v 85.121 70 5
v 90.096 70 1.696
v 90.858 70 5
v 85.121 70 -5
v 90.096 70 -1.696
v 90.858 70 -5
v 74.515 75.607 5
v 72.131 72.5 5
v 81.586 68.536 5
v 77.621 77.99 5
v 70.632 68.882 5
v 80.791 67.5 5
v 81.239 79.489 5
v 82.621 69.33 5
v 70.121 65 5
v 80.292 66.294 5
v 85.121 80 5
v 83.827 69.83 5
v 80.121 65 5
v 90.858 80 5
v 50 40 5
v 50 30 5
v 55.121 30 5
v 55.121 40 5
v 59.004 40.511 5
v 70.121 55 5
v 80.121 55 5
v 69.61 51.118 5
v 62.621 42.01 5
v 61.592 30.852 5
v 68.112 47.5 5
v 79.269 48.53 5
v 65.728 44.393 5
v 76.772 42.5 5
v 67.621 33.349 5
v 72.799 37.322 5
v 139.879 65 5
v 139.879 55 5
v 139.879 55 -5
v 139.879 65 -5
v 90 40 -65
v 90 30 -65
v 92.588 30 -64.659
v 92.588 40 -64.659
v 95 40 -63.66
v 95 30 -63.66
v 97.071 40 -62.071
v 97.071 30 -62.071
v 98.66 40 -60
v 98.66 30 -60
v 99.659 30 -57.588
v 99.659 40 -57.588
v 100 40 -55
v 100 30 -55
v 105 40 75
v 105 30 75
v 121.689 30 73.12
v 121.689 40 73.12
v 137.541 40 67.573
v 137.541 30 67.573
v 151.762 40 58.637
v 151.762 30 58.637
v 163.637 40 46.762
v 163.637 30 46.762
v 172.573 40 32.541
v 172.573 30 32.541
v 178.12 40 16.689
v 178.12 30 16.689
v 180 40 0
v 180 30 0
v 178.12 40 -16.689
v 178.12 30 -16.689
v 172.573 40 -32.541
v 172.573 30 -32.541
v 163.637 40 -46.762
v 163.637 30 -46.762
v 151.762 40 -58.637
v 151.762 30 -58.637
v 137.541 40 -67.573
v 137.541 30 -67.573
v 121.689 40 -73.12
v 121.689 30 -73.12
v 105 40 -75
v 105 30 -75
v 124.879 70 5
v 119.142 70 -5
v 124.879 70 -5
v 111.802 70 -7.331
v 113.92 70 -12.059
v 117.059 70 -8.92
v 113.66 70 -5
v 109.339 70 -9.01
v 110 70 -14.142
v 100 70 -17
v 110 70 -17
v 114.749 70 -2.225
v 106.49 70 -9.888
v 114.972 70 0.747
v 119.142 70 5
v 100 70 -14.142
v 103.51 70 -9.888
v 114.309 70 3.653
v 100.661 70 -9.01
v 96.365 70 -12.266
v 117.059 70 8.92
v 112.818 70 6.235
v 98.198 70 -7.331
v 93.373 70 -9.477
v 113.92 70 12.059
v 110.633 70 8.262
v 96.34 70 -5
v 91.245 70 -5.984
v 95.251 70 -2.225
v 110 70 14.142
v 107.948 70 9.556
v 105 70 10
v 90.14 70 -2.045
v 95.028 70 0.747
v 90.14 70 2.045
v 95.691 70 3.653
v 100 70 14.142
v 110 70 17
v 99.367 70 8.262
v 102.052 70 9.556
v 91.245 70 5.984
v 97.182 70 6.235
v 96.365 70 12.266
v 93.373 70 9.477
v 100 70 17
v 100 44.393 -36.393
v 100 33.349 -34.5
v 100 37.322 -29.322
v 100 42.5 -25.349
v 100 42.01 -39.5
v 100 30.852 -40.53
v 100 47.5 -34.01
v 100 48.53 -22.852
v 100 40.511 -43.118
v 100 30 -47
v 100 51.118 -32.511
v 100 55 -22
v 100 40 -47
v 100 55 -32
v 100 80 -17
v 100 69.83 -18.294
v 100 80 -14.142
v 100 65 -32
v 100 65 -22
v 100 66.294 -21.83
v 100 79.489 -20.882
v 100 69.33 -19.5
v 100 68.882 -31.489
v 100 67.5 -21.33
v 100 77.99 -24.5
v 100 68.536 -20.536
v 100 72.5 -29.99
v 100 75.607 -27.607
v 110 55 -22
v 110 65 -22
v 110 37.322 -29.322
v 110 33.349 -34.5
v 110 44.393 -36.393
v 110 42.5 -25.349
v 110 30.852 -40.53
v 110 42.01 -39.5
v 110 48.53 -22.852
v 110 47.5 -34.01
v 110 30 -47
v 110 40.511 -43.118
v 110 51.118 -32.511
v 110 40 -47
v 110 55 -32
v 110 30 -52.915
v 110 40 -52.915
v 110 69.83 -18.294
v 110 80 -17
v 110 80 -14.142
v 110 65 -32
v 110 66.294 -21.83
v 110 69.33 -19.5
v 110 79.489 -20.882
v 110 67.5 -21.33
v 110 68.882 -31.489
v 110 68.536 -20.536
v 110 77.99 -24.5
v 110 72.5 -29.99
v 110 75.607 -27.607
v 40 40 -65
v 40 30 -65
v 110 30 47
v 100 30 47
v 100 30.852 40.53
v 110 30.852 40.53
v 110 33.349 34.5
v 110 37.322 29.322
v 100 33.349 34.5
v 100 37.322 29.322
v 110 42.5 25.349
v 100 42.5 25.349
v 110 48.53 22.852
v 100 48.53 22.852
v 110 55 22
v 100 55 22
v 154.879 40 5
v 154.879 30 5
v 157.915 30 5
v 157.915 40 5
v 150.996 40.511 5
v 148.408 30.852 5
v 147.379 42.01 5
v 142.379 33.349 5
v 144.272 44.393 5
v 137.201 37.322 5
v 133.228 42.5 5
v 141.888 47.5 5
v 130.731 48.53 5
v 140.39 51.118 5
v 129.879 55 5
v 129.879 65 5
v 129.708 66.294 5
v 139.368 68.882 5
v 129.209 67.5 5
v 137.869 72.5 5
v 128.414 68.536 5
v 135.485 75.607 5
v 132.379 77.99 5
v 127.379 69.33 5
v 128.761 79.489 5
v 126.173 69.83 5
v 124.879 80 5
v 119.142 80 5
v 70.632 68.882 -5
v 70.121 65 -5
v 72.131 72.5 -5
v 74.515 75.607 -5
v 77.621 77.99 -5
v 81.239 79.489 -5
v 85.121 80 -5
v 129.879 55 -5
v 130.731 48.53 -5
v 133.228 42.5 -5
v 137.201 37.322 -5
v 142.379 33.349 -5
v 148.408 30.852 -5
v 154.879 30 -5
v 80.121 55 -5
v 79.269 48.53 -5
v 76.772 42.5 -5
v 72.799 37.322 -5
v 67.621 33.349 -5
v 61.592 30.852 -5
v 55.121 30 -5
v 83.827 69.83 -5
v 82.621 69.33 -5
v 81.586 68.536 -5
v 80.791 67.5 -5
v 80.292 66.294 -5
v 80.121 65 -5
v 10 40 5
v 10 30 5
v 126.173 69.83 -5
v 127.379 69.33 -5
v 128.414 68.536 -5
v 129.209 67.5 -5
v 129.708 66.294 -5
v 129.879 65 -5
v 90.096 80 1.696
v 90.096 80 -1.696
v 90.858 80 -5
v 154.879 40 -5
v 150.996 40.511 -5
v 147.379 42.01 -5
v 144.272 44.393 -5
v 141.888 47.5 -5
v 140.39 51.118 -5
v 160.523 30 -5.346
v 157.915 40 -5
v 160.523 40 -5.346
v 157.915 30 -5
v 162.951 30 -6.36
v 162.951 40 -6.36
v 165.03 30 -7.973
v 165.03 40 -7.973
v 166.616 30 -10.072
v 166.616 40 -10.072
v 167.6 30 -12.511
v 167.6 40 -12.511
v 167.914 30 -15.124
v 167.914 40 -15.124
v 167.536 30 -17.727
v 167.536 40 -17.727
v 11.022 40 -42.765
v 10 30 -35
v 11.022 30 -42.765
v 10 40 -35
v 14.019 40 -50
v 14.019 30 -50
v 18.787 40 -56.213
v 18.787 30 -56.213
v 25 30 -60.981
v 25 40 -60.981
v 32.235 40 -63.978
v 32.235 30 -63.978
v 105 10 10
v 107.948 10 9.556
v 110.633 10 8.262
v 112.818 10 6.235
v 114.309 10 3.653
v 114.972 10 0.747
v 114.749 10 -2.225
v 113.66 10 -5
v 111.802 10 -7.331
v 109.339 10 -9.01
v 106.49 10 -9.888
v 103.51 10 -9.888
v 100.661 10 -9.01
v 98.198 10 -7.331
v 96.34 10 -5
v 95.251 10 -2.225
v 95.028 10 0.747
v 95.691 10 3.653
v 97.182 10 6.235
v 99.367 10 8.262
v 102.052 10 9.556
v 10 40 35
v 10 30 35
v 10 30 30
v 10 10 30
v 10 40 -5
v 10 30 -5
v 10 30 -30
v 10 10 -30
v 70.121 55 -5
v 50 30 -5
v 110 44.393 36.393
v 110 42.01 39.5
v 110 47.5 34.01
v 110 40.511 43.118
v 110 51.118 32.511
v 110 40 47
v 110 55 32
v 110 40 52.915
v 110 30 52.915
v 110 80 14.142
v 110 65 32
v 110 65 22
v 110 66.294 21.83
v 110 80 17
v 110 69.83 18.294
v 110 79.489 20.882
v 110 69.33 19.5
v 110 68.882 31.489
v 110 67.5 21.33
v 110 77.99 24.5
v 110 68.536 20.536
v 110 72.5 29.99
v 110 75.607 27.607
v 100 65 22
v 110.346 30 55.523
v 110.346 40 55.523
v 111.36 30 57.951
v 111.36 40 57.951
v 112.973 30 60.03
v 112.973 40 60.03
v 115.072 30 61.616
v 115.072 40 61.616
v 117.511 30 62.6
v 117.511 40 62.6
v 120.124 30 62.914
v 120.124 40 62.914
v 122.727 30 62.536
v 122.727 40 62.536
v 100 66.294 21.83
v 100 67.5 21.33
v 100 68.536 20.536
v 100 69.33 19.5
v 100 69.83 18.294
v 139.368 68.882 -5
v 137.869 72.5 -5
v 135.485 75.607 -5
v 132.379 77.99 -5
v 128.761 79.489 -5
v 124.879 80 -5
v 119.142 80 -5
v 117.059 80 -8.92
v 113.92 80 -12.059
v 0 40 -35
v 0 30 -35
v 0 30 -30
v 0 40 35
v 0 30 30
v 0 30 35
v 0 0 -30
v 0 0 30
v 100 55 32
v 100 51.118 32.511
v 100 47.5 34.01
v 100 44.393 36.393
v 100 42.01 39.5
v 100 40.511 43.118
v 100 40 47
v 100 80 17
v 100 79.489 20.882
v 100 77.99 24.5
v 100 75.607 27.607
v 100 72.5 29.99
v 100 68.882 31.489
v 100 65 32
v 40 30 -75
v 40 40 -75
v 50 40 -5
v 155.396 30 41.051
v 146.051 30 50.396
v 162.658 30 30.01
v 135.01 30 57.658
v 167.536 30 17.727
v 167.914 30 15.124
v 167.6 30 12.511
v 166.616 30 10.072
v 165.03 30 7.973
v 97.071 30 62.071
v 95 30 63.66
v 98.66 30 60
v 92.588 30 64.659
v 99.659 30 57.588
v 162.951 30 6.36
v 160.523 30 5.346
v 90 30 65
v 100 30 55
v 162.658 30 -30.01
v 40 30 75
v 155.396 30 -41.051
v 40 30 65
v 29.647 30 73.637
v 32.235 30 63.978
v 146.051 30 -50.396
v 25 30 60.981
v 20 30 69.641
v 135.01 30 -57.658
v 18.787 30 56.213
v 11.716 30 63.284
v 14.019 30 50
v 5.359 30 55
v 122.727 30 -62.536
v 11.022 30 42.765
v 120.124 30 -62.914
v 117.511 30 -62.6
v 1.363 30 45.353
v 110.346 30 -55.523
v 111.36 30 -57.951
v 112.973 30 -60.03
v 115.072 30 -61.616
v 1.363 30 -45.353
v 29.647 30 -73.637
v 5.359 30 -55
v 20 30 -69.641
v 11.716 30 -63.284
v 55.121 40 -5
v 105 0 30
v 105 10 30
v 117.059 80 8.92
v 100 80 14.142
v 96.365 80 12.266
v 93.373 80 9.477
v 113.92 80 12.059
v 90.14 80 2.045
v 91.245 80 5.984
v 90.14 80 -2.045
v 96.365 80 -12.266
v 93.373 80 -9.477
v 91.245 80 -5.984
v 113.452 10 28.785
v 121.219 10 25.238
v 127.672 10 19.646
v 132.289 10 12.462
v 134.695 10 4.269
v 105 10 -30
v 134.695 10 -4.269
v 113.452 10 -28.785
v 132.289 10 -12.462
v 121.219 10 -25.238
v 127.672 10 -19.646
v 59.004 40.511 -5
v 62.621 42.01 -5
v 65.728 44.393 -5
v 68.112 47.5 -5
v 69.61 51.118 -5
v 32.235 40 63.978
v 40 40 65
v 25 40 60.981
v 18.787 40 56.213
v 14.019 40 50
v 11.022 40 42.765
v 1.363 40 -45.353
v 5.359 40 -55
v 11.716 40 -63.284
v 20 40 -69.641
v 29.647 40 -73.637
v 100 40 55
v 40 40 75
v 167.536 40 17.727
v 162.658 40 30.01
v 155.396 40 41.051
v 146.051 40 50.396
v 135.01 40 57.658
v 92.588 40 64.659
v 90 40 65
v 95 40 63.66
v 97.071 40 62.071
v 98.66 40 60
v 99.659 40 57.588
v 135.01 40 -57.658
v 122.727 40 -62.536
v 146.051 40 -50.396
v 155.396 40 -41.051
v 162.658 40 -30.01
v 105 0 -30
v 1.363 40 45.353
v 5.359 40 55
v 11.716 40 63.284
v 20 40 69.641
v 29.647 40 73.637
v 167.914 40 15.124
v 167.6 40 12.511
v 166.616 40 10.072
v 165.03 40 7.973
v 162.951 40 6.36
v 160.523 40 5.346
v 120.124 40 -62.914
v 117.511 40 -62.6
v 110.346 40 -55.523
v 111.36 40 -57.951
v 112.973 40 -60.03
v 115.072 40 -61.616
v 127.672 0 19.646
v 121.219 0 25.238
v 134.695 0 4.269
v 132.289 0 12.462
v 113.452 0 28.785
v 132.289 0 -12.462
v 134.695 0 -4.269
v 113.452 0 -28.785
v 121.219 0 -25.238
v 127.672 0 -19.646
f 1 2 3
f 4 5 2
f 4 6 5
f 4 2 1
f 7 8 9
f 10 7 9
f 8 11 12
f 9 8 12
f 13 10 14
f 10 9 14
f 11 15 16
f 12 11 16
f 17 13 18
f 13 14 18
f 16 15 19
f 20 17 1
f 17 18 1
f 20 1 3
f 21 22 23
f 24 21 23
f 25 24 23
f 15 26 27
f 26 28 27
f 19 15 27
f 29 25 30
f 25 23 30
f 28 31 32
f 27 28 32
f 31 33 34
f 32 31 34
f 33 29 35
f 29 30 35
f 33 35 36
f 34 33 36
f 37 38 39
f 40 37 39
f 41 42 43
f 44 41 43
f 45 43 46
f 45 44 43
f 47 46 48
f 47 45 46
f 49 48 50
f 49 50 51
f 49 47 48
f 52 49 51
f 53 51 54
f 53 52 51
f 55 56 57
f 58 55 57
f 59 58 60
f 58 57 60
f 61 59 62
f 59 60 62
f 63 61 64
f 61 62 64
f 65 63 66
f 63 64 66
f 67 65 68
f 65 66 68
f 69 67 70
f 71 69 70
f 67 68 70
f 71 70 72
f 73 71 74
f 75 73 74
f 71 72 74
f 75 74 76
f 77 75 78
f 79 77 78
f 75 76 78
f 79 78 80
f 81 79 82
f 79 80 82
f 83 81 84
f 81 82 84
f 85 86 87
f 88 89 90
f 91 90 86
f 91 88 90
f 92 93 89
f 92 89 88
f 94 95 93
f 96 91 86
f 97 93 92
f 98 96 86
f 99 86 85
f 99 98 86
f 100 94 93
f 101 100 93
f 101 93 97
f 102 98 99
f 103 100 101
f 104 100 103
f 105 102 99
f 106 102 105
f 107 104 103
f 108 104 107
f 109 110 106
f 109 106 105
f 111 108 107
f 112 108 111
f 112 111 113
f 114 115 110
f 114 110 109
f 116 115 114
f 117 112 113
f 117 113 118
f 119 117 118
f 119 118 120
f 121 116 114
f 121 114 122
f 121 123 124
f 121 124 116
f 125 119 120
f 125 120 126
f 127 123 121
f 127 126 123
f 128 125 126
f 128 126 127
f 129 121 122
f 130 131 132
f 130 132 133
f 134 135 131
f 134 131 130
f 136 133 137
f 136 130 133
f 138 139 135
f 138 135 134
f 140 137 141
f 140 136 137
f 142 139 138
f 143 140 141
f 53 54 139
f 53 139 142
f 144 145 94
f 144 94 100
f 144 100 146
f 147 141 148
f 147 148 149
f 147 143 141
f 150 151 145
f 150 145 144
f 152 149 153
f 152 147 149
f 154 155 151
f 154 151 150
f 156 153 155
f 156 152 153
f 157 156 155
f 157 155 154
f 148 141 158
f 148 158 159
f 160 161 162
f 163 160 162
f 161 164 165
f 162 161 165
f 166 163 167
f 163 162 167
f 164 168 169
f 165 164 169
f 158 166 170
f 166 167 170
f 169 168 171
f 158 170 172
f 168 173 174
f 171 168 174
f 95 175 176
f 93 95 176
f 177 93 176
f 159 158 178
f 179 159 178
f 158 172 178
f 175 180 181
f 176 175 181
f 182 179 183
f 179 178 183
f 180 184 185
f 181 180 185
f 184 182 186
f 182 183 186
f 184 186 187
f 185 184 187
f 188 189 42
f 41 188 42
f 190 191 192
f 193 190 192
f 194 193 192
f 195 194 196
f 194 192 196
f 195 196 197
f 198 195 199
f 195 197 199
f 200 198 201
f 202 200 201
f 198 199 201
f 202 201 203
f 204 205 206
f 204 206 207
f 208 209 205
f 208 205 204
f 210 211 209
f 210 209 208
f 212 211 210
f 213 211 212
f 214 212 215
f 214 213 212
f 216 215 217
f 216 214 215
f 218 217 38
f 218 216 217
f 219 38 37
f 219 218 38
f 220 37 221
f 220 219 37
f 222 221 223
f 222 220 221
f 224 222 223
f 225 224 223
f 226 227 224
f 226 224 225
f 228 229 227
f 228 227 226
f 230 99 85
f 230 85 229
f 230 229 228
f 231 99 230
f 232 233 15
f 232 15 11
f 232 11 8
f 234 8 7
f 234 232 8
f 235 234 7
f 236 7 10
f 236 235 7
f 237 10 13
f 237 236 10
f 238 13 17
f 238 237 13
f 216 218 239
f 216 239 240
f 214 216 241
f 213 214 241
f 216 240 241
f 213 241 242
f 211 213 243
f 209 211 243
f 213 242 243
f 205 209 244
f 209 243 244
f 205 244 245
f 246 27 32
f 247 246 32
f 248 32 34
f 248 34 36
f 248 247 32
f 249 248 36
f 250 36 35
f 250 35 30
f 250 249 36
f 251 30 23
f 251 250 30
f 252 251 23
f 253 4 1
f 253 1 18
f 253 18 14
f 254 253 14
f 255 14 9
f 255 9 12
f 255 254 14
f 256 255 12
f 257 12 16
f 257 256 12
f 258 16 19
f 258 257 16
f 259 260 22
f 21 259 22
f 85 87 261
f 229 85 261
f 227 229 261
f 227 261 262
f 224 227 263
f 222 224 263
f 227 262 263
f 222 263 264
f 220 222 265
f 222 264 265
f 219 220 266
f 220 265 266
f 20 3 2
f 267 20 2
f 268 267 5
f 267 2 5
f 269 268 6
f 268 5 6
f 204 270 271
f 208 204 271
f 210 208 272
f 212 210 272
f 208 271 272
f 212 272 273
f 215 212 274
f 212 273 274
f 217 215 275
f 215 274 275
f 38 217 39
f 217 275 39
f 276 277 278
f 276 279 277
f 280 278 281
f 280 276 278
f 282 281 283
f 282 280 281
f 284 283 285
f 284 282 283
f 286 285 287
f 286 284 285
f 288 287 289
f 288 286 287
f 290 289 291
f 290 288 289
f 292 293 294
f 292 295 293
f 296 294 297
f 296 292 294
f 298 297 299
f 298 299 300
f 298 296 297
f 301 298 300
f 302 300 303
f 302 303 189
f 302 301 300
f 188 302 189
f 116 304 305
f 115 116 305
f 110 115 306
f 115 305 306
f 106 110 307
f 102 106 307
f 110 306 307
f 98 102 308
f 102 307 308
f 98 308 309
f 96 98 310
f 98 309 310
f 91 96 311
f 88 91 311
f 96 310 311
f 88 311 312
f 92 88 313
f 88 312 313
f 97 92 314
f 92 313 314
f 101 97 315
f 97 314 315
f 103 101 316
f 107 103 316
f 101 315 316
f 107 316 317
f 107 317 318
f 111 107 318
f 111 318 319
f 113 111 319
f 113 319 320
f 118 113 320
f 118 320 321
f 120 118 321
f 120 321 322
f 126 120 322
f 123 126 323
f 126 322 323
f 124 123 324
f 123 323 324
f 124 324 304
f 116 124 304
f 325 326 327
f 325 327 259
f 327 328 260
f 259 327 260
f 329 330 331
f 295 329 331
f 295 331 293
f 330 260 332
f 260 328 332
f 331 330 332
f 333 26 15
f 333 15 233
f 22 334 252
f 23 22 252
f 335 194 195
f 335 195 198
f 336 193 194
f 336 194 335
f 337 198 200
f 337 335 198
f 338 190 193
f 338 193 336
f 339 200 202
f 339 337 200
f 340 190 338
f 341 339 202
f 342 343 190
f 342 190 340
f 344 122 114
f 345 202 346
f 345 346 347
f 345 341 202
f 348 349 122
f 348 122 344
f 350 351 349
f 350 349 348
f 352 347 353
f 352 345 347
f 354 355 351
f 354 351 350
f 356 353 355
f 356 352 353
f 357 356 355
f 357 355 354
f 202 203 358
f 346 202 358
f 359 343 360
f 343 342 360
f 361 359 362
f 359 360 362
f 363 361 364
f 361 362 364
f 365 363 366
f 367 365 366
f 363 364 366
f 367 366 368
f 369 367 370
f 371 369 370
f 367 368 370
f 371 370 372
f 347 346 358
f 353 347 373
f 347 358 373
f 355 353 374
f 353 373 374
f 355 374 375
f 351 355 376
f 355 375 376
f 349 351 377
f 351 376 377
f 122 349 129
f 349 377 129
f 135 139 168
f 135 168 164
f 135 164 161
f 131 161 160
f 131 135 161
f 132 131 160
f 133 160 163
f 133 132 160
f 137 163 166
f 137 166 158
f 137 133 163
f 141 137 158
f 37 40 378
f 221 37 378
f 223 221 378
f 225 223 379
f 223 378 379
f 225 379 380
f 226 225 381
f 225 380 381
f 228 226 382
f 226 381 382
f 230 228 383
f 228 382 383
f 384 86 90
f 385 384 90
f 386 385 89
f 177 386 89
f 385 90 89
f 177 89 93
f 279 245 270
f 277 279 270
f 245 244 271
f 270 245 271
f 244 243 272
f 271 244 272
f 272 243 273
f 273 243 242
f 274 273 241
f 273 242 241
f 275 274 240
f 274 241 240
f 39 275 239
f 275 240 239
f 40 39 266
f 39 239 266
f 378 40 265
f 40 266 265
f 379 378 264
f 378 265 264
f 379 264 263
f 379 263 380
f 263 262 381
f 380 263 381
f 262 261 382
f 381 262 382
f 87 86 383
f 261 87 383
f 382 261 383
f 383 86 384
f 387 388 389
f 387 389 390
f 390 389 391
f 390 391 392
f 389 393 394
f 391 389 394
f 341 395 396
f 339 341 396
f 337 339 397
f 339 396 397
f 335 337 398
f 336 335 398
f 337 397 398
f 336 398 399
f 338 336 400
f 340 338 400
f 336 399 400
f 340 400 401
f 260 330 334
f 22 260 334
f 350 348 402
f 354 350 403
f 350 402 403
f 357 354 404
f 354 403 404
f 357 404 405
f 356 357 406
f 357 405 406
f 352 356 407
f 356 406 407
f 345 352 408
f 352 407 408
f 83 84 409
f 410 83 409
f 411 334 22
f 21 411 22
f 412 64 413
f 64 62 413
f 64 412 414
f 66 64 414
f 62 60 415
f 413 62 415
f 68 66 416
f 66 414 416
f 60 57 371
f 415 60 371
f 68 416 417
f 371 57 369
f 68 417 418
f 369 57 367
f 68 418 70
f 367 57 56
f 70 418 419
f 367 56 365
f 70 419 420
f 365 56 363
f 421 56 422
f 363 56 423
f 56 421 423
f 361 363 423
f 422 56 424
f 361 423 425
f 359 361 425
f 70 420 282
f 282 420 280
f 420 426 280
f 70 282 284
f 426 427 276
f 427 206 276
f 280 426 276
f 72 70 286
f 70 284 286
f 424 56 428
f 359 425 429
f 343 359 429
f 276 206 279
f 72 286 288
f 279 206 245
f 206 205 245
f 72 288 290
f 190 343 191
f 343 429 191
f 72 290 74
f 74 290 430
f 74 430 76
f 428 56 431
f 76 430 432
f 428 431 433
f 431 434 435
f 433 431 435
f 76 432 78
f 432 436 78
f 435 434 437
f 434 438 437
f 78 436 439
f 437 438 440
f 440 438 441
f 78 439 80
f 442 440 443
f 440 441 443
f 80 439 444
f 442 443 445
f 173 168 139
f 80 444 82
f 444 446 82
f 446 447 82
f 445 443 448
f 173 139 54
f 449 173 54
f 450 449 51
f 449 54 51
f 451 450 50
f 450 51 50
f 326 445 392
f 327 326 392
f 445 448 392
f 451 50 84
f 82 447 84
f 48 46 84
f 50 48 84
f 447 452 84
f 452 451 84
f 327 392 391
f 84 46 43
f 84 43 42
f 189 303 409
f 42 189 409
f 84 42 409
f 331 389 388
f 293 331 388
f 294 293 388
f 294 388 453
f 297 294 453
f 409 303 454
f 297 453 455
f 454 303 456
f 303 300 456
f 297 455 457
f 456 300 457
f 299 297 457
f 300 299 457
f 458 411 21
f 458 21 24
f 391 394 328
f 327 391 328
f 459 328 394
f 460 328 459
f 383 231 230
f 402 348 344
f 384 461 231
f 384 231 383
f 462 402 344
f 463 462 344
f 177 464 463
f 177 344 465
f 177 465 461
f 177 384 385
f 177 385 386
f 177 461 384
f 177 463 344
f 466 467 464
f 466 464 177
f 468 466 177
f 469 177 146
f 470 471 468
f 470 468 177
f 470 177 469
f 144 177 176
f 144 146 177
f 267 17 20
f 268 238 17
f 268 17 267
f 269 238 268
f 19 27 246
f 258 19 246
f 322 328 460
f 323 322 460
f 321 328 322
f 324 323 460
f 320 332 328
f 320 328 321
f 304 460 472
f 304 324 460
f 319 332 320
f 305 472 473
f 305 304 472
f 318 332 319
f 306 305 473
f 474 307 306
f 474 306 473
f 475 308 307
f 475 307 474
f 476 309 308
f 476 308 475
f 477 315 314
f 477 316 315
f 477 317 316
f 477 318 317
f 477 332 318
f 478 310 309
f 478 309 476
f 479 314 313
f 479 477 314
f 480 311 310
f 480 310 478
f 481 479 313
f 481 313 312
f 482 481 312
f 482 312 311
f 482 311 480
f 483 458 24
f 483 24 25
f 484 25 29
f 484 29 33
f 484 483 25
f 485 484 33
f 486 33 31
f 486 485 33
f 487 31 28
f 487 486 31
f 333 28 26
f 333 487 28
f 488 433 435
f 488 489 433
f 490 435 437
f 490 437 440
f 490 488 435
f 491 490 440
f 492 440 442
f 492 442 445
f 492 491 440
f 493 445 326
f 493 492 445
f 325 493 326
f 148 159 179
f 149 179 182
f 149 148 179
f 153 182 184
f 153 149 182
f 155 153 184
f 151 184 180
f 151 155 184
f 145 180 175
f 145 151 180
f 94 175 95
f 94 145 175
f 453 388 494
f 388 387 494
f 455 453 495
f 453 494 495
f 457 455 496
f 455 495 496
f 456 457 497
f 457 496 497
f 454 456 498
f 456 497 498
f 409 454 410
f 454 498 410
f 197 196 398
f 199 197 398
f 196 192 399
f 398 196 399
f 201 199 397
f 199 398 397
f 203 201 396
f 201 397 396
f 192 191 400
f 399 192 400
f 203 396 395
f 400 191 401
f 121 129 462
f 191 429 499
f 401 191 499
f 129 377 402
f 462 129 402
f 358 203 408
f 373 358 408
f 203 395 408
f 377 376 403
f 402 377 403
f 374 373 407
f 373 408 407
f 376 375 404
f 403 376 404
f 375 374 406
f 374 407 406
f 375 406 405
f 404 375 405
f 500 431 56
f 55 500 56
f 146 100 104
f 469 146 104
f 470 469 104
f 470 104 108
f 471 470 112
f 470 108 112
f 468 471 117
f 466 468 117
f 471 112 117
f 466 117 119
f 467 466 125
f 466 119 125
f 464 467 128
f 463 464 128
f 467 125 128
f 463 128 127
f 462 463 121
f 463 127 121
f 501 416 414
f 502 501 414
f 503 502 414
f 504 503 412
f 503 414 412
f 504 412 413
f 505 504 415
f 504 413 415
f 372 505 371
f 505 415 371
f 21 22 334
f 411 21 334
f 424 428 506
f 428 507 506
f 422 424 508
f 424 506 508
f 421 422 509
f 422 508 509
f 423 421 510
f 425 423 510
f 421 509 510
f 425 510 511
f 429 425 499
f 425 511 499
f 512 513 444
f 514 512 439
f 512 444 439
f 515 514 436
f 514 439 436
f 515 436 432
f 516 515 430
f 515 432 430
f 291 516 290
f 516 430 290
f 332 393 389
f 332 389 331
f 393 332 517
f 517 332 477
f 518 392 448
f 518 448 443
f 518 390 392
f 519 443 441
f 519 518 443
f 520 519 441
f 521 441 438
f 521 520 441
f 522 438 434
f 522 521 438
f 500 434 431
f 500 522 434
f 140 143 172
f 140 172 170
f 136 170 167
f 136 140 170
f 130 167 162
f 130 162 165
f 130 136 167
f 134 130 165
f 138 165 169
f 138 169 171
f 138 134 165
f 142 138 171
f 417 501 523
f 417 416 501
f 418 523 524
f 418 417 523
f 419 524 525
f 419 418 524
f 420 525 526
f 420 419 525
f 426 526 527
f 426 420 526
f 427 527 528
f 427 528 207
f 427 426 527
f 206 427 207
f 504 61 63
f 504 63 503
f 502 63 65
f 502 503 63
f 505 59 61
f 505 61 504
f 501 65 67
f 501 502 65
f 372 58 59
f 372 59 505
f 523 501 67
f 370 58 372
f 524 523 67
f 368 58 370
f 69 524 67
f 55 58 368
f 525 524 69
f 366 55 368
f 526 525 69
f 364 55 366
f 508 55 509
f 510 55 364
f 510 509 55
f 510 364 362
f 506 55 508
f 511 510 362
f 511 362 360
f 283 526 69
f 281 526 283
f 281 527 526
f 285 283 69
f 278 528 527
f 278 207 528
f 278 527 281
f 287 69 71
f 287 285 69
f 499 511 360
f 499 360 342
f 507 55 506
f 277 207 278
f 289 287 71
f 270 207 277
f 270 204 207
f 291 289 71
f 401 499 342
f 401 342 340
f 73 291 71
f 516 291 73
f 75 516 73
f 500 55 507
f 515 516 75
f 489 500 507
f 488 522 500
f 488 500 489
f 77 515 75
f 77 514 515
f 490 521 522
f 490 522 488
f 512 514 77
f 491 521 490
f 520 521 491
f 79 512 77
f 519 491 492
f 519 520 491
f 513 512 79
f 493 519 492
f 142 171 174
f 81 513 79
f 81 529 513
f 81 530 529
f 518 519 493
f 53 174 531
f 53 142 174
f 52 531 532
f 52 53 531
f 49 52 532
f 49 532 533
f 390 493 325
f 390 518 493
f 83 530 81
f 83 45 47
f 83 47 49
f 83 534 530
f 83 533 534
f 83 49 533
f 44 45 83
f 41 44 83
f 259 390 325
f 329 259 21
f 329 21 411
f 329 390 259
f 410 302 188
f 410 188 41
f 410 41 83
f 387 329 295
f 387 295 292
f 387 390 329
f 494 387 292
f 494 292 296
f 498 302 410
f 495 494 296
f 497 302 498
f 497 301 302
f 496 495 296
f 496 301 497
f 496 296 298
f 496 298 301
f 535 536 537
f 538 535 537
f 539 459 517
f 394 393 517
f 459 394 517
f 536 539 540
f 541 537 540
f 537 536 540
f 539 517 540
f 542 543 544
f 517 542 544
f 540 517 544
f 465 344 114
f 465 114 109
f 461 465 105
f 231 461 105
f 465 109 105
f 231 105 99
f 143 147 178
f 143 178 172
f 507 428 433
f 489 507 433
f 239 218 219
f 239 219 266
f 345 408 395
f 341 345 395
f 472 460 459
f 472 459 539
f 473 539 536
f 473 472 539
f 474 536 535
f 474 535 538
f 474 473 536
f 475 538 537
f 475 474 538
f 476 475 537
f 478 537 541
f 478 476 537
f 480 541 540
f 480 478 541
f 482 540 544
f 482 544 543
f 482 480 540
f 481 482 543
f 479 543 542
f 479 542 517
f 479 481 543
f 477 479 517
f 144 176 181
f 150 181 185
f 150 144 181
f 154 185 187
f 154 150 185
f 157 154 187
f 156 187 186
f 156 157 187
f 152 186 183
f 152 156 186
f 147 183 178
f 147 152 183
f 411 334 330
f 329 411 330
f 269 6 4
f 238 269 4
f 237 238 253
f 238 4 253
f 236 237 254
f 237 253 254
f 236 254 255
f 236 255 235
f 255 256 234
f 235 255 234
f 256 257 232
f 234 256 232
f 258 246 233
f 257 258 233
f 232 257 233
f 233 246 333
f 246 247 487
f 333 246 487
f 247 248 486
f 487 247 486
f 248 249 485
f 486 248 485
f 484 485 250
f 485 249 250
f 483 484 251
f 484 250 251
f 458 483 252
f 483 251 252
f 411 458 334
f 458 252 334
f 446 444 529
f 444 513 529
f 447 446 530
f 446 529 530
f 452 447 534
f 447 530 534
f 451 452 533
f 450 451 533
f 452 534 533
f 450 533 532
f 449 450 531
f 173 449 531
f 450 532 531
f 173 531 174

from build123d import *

# Parameters (mm, degrees)
BOSS_EXTRUDE1_DEPTH = 30
BOSS_EXTRUDE2_DEPTH = 10
SKETCH4_R           = 10
BOSS_EXTRUDE3_DEPTH = 60
SKETCH5_R           = 15
BOSS_EXTRUDE4_DEPTH = 10
BOSS_EXTRUDE5_DEPTH = 10
SWEEP4_START        = 55
SWEEP4_OUTLINE_W    = 10
SWEEP4_OUTLINE_H    = 10
SWEEP4_DEPTH        = 10
SWEEP4_START_2      = 30
SWEEP4_2_DEPTH      = 25
SWEEP4_START_3      = 65
SWEEP4_3_DEPTH      = 15
SWEEP4_START_4      = -5
SWEEP4_4_DEPTH      = 10
SWEEP6_START        = 100
SWEEP6_DEPTH        = 10
BOSS_EXTRUDE6_REACH = 195.972
SKETCH12_W          = 10
SKETCH12_H          = 10
FILLET1_R           = 30
FILLET2_R           = 40
FILLET3_R           = 10


with BuildPart() as part:
    # Sketch2 → Boss-Extrude1 (new, symmetric)
    with BuildSketch(Plane.XY):
        Polygon((0, 10), (0, 0), (10, 0), (105, 0), (105, 10), (10, 10), (10, 30), (0, 30), align=None)
    extrude(amount=BOSS_EXTRUDE1_DEPTH, both=True)

    # Sketch3 → Boss-Extrude2 (add)
    with BuildSketch(Plane(origin=(0, 10, 0), x_dir=(1, 0, 0), z_dir=(0, 1, 0))):
        with BuildLine():
            Line((105, 30), (105, -30))
            ThreePointArc((105, -30), (135, 0), (105, 30))
        make_face()
    extrude(amount=-BOSS_EXTRUDE2_DEPTH)

    # Sketch4 → Boss-Extrude3 (add)
    with BuildSketch(Plane(origin=(0, 10, 0), x_dir=(1, 0, 0), z_dir=(0, 1, 0))):
        with Locations(Location((105, 0, 0), (0, 0, 270))):
            Circle(SKETCH4_R)
    extrude(amount=BOSS_EXTRUDE3_DEPTH)

    # Sketch5 → Boss-Extrude4 (add)
    with BuildSketch(Plane(origin=(0, 70, 0), x_dir=(1, 0, 0), z_dir=(0, 1, 0))):
        with Locations(Location((105, 0, 0), (0, 0, 270))):
            Circle(SKETCH5_R)
    extrude(amount=BOSS_EXTRUDE4_DEPTH)

    # Sketch6 → Boss-Extrude5 (add)
    with BuildSketch(Plane(origin=(0, 30, 0), x_dir=(1, 0, 0), z_dir=(0, 1, 0))):
        with BuildLine():
            Line((0, 75), (0, 0))
            Line((0, 0), (0, -75))
            Line((0, -75), (105, -75))
            ThreePointArc((105, -75), (158.033008589, -53.033008589), (180, 0))
            ThreePointArc((180, 0), (158.033008589, 53.033008589), (105, 75))
            Line((105, 75), (0, 75))
        make_face()
        with BuildLine():
            Line((10, -65), (10, -5))
            Line((10, -5), (50, -5))
            Line((50, -5), (50, 5))
            Line((50, 5), (10, 5))
            Line((10, 5), (10, 65))
            Line((10, 65), (100, 65))
            Line((100, 65), (100, 50))
            Line((100, 50), (110, 50))
            Line((110, 50), (110, 64.807406984))
            ThreePointArc((110, 64.807406984), (152.696960071, 44.158804332), (170, 0))
            ThreePointArc((170, 0), (152.696960071, -44.158804332), (110, -64.807406984))
            Line((110, -64.807406984), (110, -50))
            Line((110, -50), (100, -50))
            Line((100, -50), (100, -65))
            Line((100, -65), (10, -65))
        make_face(mode=Mode.SUBTRACT)
    extrude(amount=BOSS_EXTRUDE5_DEPTH)

    # Sweep6: read off the stored shape, not the designer's step
    # Sweep6 outline → Sweep6 (add)
    with BuildSketch(Plane.YZ.offset(SWEEP6_START)):
        with BuildLine():
            Line((70, 17), (70, 13))
            Line((70, 13), (80, 13))
            Line((80, 13), (80, 17))
            ThreePointArc((80, 17), (75.606601718, 27.606601718), (65, 32))
            Line((65, 32), (55, 32))
            ThreePointArc((55, 32), (44.393398282, 36.393398282), (40, 47))
            Line((40, 47), (40, 50))
            Line((40, 50), (30, 50))
            Line((30, 50), (30, 47))
            ThreePointArc((30, 47), (37.32233047, 29.32233047), (55, 22))
            Line((55, 22), (65, 22))
            ThreePointArc((65, 22), (68.535533906, 20.535533906), (70, 17))
        make_face()
    sweep6 = extrude(amount=SWEEP6_DEPTH)

    # Mirror1: Sweep6 across plane
    add(sweep6.mirror(Plane.XY))

    # Sketch12 → Boss-Extrude6 (add, up to next)
    with BuildSketch(Plane(origin=(160, 0, 0), x_dir=(0, 0, -1), z_dir=(1, 0, 0)), mode=Mode.PRIVATE) as boss_extrude6_sk1:
        with Locations((0, 35)):
            Rectangle(SKETCH12_W, SKETCH12_H)
    boss_extrude6_tool1 = extrude(boss_extrude6_sk1.sketch, amount=BOSS_EXTRUDE6_REACH, mode=Mode.PRIVATE) - part.part


with BuildPart() as body_2:
    # Sweep4: read off the stored shape, not the designer's step
    # Sweep4 outline → Sweep4 (new body)
    with BuildSketch(Plane(origin=(0, 0, 0), x_dir=(1, 0, 0), z_dir=(0, 1, 0)).offset(SWEEP4_START)):
        with Locations((75.121266537, 0)):
            Rectangle(SWEEP4_OUTLINE_W, SWEEP4_OUTLINE_H)
    extrude(amount=SWEEP4_DEPTH)

    # Sweep4 2 outline → Sweep4 2 (add)
    with BuildSketch(Plane(origin=(0, 0, 0), x_dir=(1, 0, 0), z_dir=(0, 1, 0)).offset(SWEEP4_START_2)):
        with BuildLine():
            Line((50, -5), (90.857864376, -5))
            ThreePointArc((90.857864376, -5), (90, 0), (90.857864376, 5))
            Line((90.857864376, 5), (50, 5))
            Line((50, 5), (50, -5))
        make_face()
    extrude(amount=SWEEP4_2_DEPTH)

    # Sweep4 3 outline → Sweep4 3 (add)
    with BuildSketch(Plane(origin=(0, 0, 0), x_dir=(1, 0, 0), z_dir=(0, 1, 0)).offset(SWEEP4_START_3)):
        with BuildLine():
            Line((50, -5), (90.857864376, -5))
            ThreePointArc((90.857864376, -5), (90, 0), (90.857864376, 5))
            Line((90.857864376, 5), (50, 5))
            Line((50, 5), (50, -5))
        make_face()
    extrude(amount=SWEEP4_3_DEPTH)

    # Sweep4 4 outline → Sweep4 4 (cut)
    with BuildSketch(Plane.XY.offset(SWEEP4_START_4)):
        with BuildLine():
            ThreePointArc((70.121266537, 65), (74.514664819, 75.606601718), (85.121266537, 80))
            Line((85.121266537, 80), (50, 80))
            Line((50, 80), (50, 65))
            Line((50, 65), (70.121266537, 65))
        make_face()
        with BuildLine():
            Line((50, 40), (55.121266537, 40))
            ThreePointArc((55.121266537, 40), (65.727868255, 44.393398282), (70.121266537, 55))
            Line((70.121266537, 55), (50, 55))
            Line((50, 55), (50, 40))
        make_face()
        with BuildLine():
            ThreePointArc((80.121266537, 55), (72.798936067, 37.32233047), (55.121266537, 30))
            Line((55.121266537, 30), (92, 30))
            Line((92, 30), (92, 55))
            Line((92, 55), (80.121266537, 55))
        make_face()
        with BuildLine():
            Line((92, 65), (92, 70))
            Line((92, 70), (85.121266537, 70))
            ThreePointArc((85.121266537, 70), (81.585732631, 68.535533906), (80.121266537, 65))
            Line((80.121266537, 65), (92, 65))
        make_face()
    extrude(amount=SWEEP4_4_DEPTH, mode=Mode.SUBTRACT)


with BuildPart() as body_3:
    # Mirror4: mirrored copy
    add(body_2.part.mirror(Plane(origin=(105, 0, 0), x_dir=(0, 0, 1), z_dir=(1, 0, 0))))


with BuildPart() as part_1:
    add(part.part)

    add(body_3.part)  # Boss-Extrude6 merges body 3
    add(boss_extrude6_tool1.solids().sort_by_distance((160, 35, 0))[0])

    # Fillet1
    fillet1_edges = [part_1.edges().sort_by_distance(p)[0] for p in [
        (10, 35, 65),
        (10, 35, -65),
    ]]
    fillet(fillet1_edges, radius=FILLET1_R)

    # Fillet2
    fillet2_edges = [part_1.edges().sort_by_distance(p)[0] for p in [
        (0, 35, -75),
        (0, 35, 75),
    ]]
    fillet(fillet2_edges, radius=FILLET2_R)

    # Fillet3
    fillet3_edges = [part_1.edges().sort_by_distance(p)[0] for p in [
        (169.807406984, 35, 5),
        (169.807406984, 35, -5),
        (110, 35, -64.807406984),
        (110, 35, 64.807406984),
        (100, 35, 65),
        (100, 35, -65),
    ]]
    fillet(fillet3_edges, radius=FILLET3_R)


solid = Compound([body_2.part, part_1.part])
